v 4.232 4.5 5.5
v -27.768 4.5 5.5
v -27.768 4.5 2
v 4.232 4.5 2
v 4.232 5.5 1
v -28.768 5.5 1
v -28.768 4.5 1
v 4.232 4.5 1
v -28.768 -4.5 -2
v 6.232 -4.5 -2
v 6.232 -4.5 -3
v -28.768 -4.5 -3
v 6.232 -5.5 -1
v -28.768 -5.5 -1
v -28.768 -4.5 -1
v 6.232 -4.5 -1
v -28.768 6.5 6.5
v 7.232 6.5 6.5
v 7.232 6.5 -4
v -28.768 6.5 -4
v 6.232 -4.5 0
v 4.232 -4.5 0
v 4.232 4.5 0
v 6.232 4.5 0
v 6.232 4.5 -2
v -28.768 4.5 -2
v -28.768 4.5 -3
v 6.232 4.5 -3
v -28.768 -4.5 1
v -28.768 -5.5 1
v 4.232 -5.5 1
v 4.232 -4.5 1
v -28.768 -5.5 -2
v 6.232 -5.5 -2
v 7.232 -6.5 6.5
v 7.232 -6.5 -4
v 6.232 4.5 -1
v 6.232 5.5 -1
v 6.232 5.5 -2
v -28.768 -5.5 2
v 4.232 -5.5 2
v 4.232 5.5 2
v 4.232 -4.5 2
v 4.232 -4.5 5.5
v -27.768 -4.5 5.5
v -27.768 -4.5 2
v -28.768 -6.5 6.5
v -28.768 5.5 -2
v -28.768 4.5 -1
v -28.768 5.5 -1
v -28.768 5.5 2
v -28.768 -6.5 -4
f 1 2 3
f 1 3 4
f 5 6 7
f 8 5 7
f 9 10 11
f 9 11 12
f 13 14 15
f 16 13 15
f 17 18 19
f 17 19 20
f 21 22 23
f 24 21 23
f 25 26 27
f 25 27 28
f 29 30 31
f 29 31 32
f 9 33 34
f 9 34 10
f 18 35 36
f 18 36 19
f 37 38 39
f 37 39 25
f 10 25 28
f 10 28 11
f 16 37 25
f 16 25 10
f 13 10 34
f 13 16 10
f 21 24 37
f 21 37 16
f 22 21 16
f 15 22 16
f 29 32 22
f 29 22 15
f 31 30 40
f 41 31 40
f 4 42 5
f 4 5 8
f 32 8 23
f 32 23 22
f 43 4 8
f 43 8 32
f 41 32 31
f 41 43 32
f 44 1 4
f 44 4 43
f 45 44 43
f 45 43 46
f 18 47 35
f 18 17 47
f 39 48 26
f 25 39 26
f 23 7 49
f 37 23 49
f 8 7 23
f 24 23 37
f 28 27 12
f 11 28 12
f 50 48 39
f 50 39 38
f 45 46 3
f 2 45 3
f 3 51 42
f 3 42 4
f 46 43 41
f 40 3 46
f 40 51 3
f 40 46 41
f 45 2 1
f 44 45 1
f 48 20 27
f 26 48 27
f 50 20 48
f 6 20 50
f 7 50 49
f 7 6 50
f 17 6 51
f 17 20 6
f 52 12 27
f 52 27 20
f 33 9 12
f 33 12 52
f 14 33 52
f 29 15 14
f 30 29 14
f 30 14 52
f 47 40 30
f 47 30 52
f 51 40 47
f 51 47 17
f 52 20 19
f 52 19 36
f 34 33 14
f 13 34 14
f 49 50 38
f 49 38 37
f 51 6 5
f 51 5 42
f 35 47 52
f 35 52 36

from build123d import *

# Parameters (mm, degrees)
F0_W      = 32
F0_H      = 9
F0_W_2    = 1
F1_DEPTH  = 6.5
F2_DEPTH  = 5.5
F3_DEPTH  = 4
F4_W      = 1
F4_H      = 1
F5_DEPTH  = 35
F6_DEPTH  = 33
F9_DEPTH  = 2
F4_W_2    = 9
F10_DEPTH = 33


with BuildPart() as f1:
    # F0 (on Top) → F1 (new body)
    with BuildSketch(Plane.XY):
        Polygon((4.2322745472, -4.5), (-27.7677254528, -4.5), (-28.7677254528, -4.5), (-28.7677254528, -6.5), (7.2322745472, -6.5), (7.2322745472, 6.5), (-28.7677254528, 6.5), (-28.7677254528, 4.5), (-27.7677254528, 4.5), (4.2322745472, 4.5), align=None)
        with Locations((-11.7677254528, 0)):
            Rectangle(F0_W, F0_H)
        with Locations((-28.2677254528, 0)):
            Rectangle(F0_W_2, F0_H)
    extrude(amount=F1_DEPTH)

    # F0 (on Top) → F2 (cut)
    with BuildSketch(Plane.XY):
        with Locations((-11.7677254528, 0)):
            Rectangle(F0_W, F0_H)
    extrude(amount=F2_DEPTH, mode=Mode.SUBTRACT)

    # F0 (on Top) → F3 (join)
    with BuildSketch(Plane.XY):
        Polygon((4.2322745472, -4.5), (-27.7677254528, -4.5), (-28.7677254528, -4.5), (-28.7677254528, -6.5), (7.2322745472, -6.5), (7.2322745472, 6.5), (-28.7677254528, 6.5), (-28.7677254528, 4.5), (-27.7677254528, 4.5), (4.2322745472, 4.5), align=None)
    extrude(amount=-F3_DEPTH)

    # F4 (on face) → F5 (cut)
    with BuildSketch(Plane(origin=(-28.7677254528, 0, 0), x_dir=(0, -1, 0), z_dir=(-1, 0, 0))):
        with Locations((-5, -1.5)):
            Rectangle(F4_W, F4_H)
    extrude(amount=-F5_DEPTH, mode=Mode.SUBTRACT)

    # F4 (on face) → F6 (cut)
    with BuildSketch(Plane(origin=(-28.7677254528, 0, 0), x_dir=(0, -1, 0), z_dir=(-1, 0, 0))):
        with Locations((-5, 1.5)):
            Rectangle(F4_W, F4_H)
        Polygon((-4.5, 1), (-4.5, 0), (0, 0), (0, 2), (-4.5, 2), align=None)
    extrude(amount=-F6_DEPTH, mode=Mode.SUBTRACT)

    # F7: F1 across plane


with BuildPart() as f1_1:
    add(f1.part)
    add(f1.part.mirror(Plane.XZ), mode=Mode.INTERSECT)

    # F8 (on face) → F9 (cut)
    with BuildSketch(Plane(origin=(4.2322745472, 0, 0), x_dir=(0, -1, 0), z_dir=(-1, 0, 0))):
        Polygon((4.5, 0), (-4.5, 0), (-4.5, -1), (-4.5, -2), (-4.5, -3), (4.5, -3), (4.5, -2), (4.5, -1), align=None)
    extrude(amount=-F9_DEPTH, mode=Mode.SUBTRACT)

    # F4 (on face) → F10 (join, through all)
    with BuildSketch(Plane(origin=(-28.7677254528, 0, 0), x_dir=(0, -1, 0), z_dir=(-1, 0, 0))):
        with Locations((0, -3.5)):
            Rectangle(F4_W_2, F4_H)
    extrude(amount=-F10_DEPTH)


solid = f1_1.part
